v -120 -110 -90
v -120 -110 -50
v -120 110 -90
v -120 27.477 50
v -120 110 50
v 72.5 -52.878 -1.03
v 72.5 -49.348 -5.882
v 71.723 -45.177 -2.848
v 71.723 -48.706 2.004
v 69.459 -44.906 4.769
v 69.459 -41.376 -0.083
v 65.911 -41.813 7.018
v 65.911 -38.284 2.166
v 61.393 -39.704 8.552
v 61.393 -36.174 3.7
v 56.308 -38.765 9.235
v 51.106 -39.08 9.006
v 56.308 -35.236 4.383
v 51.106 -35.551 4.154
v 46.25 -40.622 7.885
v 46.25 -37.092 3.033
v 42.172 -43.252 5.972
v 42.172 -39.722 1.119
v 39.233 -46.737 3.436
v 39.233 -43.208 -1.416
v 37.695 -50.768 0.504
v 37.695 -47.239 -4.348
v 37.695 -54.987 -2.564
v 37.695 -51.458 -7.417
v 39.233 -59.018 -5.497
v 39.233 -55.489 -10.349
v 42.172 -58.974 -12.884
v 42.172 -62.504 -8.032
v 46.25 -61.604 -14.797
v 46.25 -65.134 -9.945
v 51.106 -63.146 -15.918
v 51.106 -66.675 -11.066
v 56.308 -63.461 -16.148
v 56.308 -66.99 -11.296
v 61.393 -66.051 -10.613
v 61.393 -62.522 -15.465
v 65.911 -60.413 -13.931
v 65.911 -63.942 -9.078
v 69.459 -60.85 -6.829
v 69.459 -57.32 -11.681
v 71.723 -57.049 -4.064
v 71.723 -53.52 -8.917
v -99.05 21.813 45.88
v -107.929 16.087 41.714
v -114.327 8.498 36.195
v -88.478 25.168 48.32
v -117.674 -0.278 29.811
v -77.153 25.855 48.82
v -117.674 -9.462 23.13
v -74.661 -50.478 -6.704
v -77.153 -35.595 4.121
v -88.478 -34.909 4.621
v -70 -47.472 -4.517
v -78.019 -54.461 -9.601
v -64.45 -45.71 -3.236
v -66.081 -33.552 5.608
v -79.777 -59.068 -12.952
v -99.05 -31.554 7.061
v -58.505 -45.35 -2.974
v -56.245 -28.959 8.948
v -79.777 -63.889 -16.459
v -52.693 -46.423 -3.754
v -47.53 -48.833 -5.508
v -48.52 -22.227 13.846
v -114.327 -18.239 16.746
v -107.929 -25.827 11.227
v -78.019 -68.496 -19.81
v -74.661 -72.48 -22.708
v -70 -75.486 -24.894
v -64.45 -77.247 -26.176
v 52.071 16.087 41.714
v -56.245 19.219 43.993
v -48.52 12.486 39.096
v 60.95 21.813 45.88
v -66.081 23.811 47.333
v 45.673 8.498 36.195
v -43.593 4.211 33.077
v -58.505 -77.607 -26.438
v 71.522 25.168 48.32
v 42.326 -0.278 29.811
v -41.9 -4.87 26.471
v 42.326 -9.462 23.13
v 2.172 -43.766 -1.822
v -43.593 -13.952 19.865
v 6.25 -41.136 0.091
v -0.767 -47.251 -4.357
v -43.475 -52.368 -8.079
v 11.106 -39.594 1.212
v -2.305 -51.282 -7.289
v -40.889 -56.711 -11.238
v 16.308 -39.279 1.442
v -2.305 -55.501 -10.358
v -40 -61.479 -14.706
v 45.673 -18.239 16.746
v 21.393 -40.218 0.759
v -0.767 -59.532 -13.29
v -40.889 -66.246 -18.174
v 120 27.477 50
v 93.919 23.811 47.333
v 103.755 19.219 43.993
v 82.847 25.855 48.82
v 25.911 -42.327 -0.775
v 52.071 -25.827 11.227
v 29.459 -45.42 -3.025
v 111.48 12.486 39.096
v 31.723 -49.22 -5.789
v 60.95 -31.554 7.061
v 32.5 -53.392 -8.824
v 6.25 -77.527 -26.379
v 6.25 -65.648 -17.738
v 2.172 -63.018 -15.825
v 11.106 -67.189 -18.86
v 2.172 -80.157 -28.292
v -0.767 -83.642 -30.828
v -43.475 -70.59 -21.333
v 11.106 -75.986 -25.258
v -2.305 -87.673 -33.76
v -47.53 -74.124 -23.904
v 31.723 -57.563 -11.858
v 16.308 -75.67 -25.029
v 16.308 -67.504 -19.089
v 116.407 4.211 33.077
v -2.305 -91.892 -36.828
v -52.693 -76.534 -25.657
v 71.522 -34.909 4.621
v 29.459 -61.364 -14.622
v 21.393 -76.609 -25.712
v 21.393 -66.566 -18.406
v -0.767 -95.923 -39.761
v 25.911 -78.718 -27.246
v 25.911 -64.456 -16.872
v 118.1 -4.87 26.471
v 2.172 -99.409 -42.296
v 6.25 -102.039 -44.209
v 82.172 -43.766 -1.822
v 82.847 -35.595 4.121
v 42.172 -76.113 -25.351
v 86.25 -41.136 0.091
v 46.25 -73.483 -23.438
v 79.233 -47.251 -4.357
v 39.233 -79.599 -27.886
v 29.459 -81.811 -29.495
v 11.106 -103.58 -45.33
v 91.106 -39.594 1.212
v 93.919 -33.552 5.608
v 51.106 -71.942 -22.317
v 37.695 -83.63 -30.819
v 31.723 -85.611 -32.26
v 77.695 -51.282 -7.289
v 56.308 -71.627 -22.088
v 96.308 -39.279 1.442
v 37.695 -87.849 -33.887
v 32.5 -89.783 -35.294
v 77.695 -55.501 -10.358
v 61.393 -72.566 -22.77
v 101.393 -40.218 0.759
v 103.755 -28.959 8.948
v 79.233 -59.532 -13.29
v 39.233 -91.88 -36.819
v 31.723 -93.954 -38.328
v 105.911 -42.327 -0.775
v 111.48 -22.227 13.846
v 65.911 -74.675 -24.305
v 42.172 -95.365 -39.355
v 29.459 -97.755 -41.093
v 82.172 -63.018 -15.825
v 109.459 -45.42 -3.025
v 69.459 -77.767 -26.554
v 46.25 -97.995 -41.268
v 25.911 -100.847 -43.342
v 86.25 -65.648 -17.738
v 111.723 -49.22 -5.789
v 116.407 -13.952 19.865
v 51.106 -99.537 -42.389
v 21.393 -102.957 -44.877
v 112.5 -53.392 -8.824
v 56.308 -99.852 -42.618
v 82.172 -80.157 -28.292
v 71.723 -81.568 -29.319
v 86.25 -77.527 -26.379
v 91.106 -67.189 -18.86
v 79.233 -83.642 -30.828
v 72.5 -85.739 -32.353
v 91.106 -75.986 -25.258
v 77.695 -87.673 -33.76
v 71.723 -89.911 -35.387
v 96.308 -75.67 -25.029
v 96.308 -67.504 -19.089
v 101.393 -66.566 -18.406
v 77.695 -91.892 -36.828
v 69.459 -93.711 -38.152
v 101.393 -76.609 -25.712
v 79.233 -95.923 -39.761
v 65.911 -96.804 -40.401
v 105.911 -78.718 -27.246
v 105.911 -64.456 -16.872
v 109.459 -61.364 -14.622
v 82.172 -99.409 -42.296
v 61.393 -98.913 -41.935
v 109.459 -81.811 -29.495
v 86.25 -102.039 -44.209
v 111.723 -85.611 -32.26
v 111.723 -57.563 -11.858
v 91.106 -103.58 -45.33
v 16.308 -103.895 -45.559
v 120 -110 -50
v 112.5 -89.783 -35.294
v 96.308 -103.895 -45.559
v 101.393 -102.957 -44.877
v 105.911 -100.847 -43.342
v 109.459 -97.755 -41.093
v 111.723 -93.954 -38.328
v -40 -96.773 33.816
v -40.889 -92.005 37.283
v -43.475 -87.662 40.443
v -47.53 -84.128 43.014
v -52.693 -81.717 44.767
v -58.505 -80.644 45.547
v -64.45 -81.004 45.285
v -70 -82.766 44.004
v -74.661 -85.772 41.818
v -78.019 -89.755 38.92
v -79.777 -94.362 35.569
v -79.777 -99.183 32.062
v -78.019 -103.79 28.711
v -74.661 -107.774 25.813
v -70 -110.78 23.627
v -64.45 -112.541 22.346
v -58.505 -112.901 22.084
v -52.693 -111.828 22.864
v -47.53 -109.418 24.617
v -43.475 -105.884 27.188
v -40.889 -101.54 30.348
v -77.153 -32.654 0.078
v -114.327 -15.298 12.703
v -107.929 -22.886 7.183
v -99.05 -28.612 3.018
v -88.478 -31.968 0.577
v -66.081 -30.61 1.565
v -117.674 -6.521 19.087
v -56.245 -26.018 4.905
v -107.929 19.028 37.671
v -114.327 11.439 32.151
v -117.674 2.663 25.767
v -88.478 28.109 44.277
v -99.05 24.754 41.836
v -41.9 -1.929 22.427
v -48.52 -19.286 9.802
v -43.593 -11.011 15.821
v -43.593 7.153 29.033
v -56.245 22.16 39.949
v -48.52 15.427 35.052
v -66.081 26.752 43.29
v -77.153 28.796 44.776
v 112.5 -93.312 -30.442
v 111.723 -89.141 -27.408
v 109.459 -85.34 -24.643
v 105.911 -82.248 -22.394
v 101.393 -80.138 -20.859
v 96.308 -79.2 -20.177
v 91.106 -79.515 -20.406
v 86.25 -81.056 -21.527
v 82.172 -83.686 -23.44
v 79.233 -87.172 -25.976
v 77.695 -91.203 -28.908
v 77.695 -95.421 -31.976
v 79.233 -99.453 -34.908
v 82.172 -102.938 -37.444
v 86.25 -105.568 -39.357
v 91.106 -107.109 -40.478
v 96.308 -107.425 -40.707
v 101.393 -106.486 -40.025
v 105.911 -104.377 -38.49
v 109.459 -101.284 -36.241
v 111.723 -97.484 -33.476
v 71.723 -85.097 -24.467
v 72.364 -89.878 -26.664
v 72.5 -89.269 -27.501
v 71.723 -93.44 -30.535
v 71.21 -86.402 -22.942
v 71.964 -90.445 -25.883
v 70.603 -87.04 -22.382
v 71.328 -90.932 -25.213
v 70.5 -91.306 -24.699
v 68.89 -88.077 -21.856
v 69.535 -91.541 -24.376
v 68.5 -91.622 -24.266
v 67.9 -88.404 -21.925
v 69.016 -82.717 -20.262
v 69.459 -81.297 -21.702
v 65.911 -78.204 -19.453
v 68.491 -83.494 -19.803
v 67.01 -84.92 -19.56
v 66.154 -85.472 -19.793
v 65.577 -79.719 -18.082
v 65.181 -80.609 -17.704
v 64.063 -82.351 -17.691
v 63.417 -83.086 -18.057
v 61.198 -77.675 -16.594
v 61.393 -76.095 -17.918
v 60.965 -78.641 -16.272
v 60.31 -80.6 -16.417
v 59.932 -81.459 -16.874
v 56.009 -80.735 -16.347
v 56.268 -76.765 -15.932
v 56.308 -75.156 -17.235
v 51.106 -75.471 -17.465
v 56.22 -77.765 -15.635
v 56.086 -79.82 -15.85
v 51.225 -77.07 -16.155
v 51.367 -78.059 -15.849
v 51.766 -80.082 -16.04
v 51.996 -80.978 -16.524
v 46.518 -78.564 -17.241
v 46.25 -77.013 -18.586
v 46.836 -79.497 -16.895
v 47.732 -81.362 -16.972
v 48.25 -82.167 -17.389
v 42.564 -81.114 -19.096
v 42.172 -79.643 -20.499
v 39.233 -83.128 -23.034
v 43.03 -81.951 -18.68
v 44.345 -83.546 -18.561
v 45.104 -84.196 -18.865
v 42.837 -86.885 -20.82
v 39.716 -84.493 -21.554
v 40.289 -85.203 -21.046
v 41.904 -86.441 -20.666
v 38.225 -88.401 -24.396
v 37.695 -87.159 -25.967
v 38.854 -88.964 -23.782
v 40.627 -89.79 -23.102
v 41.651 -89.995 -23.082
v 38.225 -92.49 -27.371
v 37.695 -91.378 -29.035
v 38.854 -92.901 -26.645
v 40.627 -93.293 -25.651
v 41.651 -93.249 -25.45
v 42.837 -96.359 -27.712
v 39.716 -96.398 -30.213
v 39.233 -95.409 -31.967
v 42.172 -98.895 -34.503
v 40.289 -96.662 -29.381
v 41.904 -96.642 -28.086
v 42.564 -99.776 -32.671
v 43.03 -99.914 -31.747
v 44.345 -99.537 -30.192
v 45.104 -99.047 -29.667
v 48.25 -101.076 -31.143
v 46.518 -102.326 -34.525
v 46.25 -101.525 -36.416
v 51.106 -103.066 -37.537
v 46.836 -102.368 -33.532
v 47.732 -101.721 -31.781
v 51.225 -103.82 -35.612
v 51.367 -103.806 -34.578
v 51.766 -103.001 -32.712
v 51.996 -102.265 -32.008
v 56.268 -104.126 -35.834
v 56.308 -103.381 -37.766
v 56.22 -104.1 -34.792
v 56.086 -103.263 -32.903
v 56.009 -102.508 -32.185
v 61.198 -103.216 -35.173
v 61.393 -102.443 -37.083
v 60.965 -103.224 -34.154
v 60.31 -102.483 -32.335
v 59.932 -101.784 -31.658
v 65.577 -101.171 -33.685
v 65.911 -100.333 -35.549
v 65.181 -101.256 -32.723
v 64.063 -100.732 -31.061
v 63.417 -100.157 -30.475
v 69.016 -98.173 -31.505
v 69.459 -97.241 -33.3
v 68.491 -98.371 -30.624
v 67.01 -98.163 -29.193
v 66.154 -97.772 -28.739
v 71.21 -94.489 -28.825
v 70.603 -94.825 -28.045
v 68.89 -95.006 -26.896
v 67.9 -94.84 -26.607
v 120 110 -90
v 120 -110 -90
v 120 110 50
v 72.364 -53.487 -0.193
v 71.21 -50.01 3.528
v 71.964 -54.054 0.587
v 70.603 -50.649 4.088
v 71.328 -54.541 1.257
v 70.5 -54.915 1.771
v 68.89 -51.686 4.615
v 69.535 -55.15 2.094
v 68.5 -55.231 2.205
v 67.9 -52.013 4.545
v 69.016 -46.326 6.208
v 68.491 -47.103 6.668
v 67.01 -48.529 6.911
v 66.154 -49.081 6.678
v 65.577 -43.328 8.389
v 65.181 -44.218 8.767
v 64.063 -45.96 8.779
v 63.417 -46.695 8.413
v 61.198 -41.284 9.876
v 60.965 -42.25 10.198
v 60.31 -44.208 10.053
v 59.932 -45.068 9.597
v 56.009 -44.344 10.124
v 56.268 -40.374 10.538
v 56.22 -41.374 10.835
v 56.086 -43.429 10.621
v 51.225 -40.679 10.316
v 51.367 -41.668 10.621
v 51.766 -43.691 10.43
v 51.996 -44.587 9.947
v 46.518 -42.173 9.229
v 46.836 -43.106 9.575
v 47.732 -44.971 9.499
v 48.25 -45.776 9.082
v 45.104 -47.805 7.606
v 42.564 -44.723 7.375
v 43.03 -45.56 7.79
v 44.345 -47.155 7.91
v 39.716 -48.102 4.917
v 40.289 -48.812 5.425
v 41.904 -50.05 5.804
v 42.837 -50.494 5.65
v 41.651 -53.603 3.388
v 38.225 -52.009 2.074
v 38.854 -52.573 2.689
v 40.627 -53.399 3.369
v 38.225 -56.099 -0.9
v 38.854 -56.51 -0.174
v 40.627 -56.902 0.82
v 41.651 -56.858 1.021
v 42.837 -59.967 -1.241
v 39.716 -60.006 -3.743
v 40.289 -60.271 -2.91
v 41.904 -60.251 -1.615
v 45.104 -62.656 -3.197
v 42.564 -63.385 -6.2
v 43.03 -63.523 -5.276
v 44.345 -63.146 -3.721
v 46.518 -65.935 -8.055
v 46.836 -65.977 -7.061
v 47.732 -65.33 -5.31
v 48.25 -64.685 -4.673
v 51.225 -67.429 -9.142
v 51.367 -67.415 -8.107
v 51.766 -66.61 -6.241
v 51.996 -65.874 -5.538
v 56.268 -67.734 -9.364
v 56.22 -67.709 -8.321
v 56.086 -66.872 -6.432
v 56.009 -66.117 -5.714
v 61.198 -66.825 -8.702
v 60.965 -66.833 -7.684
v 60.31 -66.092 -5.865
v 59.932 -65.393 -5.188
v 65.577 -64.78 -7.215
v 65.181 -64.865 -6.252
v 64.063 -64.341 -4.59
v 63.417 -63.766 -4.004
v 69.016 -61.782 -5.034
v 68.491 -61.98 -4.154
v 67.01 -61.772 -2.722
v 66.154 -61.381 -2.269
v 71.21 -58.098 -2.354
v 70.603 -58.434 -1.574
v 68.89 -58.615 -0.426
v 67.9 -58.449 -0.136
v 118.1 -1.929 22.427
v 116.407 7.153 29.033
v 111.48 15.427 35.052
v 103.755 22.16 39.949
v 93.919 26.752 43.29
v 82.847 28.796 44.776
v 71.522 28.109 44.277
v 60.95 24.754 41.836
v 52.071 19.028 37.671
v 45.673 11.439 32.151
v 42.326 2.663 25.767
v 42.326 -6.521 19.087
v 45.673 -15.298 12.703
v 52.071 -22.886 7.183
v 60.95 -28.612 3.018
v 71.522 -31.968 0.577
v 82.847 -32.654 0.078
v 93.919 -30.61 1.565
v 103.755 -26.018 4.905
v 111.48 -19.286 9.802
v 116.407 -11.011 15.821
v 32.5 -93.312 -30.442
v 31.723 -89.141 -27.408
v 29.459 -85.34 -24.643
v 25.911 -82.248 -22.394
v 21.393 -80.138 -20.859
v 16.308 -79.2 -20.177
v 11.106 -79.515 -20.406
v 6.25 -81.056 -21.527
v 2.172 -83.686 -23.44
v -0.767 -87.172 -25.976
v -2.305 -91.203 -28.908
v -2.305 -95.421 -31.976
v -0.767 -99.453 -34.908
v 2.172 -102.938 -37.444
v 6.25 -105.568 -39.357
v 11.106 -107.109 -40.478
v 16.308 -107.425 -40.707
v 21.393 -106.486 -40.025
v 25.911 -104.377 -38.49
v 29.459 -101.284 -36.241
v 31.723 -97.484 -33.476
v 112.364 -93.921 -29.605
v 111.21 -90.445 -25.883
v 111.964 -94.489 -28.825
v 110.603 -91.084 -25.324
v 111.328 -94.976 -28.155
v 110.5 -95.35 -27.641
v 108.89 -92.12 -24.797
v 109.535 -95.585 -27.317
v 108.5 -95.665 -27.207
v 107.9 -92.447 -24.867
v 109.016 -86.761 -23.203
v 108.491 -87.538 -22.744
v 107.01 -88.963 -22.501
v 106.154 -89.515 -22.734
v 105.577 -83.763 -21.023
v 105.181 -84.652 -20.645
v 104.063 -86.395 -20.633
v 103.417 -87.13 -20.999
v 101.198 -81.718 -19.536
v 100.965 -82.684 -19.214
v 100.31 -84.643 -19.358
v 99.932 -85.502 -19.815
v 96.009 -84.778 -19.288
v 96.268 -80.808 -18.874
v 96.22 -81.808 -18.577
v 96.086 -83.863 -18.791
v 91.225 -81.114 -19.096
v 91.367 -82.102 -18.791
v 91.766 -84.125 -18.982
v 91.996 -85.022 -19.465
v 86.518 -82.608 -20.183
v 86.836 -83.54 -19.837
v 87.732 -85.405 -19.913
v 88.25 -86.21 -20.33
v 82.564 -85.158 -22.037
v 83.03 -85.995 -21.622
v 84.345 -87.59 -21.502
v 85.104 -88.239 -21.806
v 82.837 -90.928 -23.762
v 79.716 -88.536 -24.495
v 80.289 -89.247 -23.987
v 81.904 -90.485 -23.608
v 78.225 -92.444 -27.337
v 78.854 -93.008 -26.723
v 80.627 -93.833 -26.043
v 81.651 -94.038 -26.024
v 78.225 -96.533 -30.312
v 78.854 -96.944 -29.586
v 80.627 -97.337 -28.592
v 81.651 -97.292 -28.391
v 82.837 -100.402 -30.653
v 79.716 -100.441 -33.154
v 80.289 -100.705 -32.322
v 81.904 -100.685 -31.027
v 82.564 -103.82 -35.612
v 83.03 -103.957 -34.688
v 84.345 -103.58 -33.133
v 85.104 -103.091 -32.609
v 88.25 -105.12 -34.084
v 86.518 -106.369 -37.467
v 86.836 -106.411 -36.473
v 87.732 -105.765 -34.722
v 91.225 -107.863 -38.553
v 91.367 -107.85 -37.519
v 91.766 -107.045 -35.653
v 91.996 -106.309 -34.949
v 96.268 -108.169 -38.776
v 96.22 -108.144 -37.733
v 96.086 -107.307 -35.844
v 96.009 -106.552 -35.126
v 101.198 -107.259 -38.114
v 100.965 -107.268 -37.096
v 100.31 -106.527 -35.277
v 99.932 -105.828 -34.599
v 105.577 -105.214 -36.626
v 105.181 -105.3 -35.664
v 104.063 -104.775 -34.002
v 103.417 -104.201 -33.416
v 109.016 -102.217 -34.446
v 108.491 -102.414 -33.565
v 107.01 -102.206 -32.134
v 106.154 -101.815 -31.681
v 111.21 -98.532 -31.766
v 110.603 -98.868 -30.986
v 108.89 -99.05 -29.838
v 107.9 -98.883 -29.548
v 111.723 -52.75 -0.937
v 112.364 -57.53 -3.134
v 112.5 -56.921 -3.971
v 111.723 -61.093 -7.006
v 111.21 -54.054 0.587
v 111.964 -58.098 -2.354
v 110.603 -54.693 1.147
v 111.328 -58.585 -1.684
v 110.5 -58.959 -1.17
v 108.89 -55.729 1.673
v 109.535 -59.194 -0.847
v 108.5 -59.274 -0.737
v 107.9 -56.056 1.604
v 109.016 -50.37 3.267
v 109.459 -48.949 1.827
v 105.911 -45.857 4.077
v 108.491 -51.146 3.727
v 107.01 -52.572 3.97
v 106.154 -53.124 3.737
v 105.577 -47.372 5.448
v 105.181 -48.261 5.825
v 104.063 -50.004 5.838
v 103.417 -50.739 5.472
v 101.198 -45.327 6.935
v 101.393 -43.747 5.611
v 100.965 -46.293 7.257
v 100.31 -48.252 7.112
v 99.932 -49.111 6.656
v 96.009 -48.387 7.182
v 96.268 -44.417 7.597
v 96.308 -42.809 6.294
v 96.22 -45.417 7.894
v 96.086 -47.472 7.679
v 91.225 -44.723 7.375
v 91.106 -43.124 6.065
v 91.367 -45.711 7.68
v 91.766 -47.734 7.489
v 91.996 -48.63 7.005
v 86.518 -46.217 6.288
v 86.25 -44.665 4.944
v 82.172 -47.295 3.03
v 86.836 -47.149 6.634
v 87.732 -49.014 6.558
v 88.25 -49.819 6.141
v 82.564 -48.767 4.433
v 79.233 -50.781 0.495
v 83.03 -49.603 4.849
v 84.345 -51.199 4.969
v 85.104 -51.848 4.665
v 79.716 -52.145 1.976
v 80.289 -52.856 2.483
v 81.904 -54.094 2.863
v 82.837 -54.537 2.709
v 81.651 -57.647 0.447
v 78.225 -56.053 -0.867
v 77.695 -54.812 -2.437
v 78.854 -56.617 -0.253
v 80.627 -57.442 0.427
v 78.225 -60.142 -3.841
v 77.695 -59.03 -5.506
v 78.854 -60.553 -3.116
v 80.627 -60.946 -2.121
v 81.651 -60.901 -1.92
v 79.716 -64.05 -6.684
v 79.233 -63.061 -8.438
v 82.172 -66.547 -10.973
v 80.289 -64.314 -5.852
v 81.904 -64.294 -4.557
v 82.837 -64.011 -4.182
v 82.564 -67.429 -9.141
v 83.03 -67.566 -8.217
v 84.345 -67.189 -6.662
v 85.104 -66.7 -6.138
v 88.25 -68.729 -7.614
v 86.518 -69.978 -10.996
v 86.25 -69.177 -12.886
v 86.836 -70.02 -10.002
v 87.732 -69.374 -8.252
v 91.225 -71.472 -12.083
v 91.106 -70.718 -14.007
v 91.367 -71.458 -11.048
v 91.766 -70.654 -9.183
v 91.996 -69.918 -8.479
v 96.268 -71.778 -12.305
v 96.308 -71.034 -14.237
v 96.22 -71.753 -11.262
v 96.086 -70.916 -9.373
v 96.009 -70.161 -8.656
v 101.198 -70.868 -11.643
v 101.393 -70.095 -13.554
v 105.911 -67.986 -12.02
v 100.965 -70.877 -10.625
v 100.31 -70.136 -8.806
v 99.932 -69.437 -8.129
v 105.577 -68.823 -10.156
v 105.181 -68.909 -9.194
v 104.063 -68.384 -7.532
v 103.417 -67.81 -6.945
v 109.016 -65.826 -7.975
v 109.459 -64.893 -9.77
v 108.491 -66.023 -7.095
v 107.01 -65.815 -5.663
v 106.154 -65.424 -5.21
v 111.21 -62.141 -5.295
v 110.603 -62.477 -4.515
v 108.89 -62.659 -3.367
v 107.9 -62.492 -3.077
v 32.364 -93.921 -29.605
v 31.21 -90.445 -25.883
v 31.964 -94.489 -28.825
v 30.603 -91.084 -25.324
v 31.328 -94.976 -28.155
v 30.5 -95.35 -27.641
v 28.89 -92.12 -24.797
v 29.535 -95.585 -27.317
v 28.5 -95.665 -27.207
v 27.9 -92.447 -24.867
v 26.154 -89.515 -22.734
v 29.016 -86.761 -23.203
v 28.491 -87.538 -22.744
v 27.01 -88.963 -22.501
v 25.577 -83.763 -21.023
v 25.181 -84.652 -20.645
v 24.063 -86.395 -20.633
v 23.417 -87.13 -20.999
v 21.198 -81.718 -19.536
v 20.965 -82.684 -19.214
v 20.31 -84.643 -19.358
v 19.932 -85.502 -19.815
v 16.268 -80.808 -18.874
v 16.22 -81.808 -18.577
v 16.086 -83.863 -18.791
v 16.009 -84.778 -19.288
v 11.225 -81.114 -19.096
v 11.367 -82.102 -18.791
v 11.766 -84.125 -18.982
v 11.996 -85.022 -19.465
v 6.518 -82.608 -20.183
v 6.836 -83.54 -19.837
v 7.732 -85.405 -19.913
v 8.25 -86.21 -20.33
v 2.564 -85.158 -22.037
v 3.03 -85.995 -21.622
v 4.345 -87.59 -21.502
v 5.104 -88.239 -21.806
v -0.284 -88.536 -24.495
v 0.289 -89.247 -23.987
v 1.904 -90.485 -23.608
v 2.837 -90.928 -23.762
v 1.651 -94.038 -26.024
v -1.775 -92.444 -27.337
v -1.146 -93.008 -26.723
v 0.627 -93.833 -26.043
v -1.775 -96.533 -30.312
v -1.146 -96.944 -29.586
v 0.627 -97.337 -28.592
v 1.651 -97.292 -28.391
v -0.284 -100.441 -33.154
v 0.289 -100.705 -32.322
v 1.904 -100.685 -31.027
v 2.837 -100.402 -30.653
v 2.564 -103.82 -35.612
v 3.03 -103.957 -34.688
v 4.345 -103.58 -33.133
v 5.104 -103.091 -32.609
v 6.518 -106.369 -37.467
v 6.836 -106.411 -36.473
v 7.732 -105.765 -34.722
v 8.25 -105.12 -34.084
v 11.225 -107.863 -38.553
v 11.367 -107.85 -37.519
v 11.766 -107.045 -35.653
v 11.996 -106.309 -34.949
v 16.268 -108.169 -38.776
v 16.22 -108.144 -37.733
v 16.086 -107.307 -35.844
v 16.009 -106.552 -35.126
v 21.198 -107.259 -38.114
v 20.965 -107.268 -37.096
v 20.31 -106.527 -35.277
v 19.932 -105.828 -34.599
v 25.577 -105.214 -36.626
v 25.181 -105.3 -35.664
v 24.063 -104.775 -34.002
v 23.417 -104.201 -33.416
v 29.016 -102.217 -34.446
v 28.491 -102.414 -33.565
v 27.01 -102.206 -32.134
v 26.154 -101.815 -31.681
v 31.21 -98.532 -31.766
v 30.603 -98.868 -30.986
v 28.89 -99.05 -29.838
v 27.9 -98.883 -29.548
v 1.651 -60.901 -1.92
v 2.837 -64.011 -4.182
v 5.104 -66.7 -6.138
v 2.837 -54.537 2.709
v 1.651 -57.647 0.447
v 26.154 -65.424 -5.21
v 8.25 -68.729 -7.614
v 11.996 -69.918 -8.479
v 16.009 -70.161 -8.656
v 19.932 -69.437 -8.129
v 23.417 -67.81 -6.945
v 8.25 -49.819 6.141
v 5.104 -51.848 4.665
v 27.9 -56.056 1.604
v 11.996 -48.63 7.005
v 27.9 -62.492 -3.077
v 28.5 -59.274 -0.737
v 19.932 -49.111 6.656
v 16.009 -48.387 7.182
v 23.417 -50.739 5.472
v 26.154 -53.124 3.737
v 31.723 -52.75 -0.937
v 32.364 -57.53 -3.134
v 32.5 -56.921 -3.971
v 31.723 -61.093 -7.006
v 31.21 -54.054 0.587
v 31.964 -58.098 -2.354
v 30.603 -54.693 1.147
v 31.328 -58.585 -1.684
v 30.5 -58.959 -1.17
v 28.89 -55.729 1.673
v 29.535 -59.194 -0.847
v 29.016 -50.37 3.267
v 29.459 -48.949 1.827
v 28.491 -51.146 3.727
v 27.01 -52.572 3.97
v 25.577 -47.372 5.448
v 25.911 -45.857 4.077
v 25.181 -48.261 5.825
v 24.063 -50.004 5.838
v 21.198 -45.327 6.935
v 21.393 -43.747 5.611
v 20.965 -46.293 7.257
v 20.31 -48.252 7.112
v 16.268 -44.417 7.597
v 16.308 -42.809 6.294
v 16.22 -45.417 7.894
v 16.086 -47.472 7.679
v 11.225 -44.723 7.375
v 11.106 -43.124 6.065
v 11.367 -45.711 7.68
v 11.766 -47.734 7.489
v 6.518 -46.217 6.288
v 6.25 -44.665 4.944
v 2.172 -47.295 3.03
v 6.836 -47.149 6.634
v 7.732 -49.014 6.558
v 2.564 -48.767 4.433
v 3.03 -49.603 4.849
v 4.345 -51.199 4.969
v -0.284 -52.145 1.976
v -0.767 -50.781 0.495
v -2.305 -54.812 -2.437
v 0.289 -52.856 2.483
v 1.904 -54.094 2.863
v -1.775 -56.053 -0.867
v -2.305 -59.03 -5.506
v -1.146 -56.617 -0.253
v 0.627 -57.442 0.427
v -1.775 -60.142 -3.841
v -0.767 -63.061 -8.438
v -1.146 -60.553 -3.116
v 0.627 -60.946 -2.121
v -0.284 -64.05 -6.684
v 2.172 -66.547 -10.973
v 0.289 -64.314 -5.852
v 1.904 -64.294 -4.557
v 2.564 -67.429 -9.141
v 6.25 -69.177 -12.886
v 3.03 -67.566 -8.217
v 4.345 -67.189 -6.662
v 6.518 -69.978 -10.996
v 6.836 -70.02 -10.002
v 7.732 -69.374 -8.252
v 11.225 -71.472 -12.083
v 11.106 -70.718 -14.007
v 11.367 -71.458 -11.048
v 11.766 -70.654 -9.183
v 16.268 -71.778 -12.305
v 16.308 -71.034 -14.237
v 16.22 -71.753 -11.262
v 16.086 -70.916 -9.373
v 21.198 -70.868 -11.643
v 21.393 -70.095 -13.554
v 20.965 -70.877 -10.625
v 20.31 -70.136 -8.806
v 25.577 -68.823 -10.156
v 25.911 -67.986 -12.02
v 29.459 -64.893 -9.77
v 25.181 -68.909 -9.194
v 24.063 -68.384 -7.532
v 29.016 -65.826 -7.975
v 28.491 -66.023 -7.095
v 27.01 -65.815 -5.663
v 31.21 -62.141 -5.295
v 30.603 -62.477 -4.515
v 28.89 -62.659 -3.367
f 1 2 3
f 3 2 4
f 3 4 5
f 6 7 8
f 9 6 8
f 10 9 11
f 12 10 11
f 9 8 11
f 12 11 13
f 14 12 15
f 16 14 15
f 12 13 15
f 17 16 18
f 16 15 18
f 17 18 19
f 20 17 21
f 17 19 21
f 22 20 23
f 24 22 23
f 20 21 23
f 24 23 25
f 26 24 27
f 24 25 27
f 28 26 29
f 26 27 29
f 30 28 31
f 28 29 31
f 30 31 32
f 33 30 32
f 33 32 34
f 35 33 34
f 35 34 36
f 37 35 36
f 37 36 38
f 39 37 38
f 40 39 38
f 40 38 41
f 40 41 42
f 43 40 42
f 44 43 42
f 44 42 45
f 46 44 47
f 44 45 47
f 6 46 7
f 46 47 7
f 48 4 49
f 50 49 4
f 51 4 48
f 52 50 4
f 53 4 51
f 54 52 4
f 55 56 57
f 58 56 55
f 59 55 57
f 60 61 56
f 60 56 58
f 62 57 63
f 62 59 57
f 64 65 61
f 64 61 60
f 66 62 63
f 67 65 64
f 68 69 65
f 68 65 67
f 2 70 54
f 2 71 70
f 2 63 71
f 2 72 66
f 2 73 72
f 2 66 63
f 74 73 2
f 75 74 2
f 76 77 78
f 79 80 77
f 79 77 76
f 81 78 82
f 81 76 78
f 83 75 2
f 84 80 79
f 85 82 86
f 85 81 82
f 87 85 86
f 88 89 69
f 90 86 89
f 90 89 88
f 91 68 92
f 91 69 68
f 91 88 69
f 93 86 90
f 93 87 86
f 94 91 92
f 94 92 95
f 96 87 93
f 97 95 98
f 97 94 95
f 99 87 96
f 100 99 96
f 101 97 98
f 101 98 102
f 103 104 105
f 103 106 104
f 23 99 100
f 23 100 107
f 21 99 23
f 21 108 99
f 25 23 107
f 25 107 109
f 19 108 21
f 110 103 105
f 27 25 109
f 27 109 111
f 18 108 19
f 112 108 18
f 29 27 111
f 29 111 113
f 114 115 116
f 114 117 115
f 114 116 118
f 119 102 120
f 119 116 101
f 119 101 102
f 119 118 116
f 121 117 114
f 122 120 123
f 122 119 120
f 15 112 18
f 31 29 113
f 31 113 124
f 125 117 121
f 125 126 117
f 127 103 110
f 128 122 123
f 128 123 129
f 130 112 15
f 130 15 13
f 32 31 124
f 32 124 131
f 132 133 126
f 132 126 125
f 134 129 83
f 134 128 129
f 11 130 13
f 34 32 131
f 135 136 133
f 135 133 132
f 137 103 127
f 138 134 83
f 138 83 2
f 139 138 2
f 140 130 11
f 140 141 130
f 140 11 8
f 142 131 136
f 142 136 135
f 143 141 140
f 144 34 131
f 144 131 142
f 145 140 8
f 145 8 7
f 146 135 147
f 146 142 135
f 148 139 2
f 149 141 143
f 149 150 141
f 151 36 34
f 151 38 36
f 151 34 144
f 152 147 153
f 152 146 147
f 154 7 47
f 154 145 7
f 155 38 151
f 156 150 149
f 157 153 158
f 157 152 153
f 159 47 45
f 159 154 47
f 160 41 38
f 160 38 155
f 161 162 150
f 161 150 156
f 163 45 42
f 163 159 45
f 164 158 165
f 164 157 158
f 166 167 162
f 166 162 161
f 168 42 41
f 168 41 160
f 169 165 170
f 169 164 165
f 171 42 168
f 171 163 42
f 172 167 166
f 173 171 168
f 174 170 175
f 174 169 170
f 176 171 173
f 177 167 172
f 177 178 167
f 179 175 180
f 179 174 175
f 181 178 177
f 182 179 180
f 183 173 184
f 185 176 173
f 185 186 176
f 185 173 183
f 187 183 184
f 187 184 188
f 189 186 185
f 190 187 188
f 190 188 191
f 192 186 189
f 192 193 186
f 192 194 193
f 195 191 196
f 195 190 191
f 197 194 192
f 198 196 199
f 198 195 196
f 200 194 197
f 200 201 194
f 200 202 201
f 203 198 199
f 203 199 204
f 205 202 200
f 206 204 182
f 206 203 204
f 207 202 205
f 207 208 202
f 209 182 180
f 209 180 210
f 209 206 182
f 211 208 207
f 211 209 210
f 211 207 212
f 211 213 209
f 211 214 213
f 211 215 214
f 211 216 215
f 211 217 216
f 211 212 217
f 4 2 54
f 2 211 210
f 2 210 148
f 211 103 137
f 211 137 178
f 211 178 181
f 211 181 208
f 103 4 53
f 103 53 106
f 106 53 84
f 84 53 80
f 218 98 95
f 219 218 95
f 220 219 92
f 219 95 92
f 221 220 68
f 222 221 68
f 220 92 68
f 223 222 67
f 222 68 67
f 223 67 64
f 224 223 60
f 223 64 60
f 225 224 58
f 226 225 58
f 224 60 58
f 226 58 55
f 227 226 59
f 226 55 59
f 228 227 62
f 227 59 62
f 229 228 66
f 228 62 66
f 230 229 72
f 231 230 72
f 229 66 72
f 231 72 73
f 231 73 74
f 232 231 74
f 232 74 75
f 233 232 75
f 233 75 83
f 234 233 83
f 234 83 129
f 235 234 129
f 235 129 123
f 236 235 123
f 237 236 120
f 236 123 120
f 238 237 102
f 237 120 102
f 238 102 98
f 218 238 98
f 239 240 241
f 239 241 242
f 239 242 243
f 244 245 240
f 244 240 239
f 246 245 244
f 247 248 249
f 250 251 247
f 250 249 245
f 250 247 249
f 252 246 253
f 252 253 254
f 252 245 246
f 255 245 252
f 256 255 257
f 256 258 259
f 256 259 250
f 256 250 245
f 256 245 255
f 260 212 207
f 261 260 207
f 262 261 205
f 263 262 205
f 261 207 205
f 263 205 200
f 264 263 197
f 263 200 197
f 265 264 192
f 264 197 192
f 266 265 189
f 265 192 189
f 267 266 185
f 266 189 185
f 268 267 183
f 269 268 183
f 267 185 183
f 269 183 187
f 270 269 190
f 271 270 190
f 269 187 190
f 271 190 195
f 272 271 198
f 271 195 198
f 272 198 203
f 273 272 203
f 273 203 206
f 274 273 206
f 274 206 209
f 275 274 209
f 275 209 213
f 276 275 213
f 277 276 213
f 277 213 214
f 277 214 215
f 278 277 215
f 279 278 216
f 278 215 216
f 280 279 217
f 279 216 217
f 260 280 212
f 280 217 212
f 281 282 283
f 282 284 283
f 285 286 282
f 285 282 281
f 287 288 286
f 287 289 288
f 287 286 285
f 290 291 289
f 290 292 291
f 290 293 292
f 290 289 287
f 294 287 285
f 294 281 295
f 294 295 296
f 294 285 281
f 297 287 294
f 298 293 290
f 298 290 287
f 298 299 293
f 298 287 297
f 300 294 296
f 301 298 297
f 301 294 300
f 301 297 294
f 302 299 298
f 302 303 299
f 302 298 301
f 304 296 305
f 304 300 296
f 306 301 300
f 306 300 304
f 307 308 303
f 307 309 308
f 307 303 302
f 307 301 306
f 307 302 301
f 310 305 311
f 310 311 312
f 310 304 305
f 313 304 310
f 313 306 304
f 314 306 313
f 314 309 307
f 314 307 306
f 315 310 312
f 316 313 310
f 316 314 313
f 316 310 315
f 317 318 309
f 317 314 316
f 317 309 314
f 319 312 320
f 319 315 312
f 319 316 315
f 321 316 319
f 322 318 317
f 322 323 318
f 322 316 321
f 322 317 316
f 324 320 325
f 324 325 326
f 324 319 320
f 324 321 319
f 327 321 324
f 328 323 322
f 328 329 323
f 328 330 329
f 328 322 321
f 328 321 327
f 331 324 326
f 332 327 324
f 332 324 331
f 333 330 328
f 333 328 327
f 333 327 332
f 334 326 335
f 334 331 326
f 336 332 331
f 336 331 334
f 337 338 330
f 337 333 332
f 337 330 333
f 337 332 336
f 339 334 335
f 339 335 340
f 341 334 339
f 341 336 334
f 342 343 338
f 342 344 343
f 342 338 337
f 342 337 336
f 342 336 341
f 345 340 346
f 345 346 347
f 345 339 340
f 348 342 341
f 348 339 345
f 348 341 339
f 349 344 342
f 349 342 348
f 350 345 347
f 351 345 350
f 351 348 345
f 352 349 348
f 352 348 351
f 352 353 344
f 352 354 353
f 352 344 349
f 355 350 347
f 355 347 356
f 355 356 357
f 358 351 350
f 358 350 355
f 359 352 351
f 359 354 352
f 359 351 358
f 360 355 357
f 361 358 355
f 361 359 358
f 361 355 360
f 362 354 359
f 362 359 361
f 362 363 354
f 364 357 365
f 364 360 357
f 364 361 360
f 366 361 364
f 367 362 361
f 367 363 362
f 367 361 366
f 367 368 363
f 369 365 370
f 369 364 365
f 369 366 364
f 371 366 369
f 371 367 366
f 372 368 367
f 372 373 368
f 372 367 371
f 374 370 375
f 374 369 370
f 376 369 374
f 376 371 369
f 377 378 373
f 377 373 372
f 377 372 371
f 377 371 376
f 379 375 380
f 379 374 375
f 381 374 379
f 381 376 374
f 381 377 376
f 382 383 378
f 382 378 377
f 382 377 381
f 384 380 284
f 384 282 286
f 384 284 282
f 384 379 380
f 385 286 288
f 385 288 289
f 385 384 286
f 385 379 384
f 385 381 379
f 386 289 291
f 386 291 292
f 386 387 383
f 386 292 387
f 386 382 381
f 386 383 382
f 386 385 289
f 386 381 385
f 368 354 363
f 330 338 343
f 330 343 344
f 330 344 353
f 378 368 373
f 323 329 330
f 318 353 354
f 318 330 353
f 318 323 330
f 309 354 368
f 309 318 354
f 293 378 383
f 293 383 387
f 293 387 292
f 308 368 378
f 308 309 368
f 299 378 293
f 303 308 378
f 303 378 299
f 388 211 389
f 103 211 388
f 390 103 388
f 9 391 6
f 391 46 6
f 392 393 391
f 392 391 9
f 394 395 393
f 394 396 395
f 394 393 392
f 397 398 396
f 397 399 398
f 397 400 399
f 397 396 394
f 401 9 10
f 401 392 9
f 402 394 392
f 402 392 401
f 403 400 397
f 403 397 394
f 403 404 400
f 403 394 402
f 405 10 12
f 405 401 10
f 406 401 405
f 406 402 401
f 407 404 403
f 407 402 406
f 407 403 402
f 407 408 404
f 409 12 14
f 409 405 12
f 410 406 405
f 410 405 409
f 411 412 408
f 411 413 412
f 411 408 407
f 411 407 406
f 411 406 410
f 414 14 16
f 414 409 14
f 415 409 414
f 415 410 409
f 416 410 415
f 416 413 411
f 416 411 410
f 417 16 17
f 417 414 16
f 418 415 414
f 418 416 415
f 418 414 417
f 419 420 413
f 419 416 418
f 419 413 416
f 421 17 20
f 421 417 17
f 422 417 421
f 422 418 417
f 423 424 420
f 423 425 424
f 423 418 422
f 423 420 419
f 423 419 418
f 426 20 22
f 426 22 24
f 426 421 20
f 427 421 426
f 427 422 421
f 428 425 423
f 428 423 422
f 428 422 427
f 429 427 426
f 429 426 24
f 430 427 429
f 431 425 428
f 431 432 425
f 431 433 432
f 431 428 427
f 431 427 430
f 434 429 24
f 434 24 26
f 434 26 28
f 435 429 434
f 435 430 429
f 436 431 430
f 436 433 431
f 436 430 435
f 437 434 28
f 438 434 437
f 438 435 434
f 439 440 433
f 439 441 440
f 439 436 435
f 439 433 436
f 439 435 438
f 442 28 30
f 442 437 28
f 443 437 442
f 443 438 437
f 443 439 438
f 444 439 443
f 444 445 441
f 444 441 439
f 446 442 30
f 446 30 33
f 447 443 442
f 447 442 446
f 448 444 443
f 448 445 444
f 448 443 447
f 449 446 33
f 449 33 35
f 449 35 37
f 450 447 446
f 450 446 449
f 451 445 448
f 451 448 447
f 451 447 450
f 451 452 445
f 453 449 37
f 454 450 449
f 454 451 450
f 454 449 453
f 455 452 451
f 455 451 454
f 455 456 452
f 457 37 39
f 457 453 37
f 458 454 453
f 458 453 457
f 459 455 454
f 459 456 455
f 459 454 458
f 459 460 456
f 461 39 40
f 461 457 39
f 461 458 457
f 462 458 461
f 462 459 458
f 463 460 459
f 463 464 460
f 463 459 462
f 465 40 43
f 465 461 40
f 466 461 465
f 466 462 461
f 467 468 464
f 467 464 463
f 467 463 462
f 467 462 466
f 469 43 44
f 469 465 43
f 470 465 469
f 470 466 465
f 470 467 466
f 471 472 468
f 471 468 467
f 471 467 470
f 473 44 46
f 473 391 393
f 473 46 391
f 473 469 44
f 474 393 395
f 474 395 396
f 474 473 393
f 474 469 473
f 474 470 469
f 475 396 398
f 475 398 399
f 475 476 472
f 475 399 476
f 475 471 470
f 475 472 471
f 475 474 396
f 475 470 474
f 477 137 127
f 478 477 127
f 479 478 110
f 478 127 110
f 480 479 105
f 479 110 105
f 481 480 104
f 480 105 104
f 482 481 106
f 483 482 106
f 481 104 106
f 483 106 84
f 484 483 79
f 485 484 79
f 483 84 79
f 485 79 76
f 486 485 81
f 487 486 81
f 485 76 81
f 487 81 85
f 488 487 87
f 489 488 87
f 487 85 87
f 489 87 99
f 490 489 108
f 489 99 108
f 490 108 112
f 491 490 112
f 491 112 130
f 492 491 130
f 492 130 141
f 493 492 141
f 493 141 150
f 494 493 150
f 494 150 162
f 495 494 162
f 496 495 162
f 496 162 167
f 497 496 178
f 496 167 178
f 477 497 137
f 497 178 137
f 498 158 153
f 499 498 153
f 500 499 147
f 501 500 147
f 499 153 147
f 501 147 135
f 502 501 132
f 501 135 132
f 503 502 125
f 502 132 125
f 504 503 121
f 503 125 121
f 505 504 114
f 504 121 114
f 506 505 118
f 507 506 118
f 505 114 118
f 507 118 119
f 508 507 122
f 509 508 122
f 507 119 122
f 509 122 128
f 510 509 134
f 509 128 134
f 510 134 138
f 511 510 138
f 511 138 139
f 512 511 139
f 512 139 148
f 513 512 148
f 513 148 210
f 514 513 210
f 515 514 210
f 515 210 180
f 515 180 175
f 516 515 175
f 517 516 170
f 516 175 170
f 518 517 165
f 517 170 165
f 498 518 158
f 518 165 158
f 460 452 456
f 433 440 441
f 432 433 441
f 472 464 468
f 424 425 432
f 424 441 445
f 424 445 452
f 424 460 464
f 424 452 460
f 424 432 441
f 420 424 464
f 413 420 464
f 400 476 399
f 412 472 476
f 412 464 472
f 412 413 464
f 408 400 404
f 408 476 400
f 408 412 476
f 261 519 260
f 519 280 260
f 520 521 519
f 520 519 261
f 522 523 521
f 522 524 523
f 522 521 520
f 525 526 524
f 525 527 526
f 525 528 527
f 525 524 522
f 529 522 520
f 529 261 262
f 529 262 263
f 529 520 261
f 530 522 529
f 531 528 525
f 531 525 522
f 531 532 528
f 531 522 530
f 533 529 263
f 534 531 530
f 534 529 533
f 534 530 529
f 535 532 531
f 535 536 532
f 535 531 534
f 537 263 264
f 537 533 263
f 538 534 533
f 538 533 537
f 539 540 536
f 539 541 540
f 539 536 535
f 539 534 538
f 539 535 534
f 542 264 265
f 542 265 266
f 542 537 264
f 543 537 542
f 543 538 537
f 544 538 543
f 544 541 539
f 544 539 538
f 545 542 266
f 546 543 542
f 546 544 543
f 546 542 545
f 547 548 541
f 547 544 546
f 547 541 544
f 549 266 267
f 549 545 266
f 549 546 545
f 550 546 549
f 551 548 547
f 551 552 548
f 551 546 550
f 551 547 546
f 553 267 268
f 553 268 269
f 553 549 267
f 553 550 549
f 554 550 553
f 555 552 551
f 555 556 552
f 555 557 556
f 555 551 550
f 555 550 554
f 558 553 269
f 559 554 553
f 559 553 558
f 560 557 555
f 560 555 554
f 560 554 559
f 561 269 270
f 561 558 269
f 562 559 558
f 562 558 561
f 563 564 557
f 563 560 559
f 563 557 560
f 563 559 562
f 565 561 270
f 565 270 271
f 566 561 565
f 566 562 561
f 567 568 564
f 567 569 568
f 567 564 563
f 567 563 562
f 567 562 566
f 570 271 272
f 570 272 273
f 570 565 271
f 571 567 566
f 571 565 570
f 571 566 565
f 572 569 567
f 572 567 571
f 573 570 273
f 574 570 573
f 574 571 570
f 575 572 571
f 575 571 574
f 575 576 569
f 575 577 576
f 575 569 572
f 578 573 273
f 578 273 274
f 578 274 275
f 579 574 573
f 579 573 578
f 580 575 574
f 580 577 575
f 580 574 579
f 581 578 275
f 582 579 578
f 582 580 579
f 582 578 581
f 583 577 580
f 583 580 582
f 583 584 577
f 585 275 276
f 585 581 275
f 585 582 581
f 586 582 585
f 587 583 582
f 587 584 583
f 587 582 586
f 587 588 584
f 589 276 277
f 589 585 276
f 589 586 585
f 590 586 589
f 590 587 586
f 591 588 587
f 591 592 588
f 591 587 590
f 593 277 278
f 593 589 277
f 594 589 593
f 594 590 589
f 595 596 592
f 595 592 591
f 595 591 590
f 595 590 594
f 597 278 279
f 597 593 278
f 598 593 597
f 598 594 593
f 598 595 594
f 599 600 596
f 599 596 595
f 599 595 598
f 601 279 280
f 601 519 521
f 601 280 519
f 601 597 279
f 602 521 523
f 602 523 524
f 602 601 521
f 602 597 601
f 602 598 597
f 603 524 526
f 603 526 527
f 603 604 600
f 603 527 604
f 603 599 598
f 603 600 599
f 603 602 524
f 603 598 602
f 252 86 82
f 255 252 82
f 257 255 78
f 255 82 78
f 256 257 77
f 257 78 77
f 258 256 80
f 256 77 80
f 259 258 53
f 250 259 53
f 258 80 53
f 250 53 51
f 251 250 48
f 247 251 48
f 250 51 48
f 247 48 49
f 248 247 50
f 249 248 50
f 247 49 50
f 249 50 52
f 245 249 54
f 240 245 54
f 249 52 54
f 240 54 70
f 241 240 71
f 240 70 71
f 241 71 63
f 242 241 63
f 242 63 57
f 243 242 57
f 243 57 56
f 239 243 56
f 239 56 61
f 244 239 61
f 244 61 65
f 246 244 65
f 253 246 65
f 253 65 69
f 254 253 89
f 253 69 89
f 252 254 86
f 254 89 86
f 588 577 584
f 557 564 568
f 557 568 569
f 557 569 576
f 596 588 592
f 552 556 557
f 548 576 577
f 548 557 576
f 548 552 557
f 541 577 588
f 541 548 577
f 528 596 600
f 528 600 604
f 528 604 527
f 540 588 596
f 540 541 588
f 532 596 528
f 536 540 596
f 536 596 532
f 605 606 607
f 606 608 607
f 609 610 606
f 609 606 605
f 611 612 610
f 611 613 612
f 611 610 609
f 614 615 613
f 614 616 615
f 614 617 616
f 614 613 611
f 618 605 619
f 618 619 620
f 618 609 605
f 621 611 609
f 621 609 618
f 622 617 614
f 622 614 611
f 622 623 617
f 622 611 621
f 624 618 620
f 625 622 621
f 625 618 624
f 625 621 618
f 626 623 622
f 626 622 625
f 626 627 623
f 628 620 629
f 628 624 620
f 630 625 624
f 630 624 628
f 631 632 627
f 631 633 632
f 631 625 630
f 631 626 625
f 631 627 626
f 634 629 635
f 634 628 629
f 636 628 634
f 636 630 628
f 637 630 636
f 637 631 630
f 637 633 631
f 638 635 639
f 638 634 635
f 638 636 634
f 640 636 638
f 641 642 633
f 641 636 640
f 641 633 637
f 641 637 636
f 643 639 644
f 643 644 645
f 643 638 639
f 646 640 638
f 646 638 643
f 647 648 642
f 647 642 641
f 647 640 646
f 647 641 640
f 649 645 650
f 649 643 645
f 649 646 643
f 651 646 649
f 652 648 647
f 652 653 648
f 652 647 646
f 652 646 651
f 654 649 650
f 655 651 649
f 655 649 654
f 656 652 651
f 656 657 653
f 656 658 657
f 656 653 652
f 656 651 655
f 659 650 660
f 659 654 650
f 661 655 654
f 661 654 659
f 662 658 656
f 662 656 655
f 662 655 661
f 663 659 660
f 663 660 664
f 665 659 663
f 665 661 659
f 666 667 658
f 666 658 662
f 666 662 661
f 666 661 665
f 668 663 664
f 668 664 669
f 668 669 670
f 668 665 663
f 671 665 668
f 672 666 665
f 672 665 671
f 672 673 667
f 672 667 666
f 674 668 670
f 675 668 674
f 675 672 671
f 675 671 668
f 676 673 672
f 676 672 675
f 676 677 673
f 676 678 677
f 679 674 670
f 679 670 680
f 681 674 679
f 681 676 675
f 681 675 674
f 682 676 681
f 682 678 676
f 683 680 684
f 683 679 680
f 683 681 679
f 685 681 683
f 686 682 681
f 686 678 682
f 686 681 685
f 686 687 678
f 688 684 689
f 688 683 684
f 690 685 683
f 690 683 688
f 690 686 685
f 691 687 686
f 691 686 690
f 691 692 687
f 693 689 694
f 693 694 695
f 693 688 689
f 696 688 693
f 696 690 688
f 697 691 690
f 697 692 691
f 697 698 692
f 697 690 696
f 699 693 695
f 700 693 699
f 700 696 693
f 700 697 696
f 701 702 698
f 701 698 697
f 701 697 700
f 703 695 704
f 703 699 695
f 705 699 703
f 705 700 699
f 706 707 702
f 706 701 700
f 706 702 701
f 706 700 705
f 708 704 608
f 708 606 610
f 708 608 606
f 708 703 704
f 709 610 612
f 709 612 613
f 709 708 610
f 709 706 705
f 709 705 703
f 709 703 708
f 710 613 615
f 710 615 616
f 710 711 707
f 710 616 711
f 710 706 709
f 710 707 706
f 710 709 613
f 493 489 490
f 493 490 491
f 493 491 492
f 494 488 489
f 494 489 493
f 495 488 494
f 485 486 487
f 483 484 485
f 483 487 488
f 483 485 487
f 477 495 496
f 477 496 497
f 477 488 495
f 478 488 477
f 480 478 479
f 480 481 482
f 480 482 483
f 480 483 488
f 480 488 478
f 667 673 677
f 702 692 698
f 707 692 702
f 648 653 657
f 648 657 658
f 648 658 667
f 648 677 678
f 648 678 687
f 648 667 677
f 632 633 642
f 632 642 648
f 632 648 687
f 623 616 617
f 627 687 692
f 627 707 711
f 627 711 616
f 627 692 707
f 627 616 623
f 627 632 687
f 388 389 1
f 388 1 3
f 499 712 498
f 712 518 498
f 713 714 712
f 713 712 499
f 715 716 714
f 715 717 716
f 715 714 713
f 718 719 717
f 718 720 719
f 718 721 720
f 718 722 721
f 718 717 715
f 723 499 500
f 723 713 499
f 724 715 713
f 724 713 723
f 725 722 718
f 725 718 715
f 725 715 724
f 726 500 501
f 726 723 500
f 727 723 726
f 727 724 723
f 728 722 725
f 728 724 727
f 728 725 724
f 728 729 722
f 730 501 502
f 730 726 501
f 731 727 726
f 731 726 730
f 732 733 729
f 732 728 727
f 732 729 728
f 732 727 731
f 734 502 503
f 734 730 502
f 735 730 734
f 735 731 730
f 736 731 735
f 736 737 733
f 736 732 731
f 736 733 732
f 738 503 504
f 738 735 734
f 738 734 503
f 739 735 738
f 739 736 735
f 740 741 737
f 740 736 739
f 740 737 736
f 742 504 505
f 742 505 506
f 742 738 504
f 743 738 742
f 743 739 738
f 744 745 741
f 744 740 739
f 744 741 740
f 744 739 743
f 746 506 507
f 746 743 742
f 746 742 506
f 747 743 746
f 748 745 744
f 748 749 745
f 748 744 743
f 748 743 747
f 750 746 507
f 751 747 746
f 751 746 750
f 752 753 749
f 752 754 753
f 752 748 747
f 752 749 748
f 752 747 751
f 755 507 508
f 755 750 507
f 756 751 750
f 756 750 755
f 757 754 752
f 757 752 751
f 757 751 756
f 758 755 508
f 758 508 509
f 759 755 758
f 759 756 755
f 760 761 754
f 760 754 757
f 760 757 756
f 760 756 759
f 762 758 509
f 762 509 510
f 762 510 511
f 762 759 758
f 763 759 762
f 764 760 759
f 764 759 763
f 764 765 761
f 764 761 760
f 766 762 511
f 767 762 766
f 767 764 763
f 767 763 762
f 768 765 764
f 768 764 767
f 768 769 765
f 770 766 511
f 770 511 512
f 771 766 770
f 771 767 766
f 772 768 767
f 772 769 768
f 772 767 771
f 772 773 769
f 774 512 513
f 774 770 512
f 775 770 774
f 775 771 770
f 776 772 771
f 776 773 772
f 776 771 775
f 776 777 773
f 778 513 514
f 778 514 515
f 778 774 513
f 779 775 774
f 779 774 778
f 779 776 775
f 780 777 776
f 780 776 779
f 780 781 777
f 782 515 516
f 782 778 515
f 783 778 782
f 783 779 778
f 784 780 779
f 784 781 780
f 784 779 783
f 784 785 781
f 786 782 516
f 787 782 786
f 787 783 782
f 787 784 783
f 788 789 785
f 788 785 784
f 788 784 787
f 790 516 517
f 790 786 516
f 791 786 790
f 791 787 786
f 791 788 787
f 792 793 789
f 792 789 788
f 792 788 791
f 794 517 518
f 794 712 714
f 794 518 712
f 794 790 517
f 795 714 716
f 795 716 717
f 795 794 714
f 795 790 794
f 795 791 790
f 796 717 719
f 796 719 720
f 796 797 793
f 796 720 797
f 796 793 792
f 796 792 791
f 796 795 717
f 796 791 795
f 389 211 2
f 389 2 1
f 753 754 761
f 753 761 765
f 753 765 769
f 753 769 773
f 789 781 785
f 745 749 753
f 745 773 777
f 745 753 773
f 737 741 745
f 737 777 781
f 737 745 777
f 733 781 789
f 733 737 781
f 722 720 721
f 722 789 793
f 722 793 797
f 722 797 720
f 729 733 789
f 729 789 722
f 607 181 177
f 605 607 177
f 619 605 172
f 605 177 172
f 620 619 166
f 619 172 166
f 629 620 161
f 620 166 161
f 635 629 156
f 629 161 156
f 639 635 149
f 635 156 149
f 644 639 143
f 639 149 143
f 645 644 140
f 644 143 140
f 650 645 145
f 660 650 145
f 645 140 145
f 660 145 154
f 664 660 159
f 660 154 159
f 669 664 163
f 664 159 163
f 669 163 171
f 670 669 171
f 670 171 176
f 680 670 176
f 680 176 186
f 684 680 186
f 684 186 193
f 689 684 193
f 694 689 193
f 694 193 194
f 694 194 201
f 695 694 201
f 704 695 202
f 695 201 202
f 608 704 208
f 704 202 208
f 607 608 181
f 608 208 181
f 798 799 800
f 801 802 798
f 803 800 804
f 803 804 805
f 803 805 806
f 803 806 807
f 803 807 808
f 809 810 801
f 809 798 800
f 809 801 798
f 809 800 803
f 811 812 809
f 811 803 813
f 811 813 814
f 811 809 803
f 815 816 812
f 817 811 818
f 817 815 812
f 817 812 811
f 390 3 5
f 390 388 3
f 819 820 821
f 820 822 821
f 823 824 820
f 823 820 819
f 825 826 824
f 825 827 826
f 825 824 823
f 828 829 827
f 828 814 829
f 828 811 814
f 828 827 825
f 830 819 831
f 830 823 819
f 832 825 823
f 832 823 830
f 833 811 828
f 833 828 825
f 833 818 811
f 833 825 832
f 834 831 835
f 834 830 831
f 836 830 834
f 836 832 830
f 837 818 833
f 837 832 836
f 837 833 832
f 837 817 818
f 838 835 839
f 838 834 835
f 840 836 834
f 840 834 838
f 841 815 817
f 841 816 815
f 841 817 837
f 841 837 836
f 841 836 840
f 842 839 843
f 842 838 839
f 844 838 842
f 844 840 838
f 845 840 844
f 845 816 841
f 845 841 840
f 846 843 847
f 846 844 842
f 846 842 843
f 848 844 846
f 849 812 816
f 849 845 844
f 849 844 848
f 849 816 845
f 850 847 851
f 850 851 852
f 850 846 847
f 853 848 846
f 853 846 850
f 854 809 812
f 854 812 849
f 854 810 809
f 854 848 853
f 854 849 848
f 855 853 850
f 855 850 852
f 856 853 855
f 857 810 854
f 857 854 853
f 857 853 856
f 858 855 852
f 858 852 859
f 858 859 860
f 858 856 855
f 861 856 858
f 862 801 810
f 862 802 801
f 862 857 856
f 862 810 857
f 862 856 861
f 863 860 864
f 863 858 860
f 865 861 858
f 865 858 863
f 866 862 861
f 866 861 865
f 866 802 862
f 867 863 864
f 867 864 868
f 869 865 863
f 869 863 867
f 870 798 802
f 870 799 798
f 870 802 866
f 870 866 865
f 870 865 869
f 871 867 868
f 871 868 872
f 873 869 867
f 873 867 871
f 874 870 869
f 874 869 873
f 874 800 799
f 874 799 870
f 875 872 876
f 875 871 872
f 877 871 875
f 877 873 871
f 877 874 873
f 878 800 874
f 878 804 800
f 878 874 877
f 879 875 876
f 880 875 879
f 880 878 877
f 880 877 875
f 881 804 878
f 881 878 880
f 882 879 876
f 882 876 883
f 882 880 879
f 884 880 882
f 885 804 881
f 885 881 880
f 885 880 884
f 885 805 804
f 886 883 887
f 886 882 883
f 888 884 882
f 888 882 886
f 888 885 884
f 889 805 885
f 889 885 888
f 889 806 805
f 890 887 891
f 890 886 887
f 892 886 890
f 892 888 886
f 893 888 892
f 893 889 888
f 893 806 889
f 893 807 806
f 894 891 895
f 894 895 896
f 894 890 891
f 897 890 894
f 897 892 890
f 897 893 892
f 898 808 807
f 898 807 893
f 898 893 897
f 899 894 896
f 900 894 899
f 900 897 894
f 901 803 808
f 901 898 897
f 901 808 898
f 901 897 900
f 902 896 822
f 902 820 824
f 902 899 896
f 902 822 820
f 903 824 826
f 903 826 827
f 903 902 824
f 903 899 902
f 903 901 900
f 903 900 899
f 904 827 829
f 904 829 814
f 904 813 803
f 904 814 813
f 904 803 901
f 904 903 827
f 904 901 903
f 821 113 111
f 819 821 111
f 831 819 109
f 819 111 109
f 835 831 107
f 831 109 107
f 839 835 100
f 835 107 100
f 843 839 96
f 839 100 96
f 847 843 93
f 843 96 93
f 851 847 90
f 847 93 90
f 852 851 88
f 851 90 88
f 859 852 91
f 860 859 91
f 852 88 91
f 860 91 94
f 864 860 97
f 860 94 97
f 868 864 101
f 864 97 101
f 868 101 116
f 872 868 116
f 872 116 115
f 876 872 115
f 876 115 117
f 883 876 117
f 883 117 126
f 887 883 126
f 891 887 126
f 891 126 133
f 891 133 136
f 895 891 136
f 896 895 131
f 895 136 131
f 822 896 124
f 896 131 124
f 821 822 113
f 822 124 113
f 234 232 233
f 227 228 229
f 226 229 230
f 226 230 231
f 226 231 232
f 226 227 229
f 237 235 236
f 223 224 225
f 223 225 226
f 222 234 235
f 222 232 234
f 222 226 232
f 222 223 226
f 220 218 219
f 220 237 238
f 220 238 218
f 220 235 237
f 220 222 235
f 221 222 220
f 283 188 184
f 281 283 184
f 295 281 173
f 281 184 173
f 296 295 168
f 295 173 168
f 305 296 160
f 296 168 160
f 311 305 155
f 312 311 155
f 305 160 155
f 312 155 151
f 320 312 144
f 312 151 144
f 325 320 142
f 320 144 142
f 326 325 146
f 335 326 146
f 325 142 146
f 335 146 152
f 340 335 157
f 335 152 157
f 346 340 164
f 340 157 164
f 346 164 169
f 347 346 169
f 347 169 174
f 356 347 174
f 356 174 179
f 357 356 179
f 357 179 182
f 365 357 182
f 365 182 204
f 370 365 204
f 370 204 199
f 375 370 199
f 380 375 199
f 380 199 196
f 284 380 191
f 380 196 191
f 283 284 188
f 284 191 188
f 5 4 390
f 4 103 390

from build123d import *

# Parameters (mm, degrees)
F0_W     = 82.5227291513
F0_H     = 100
F1_DEPTH = 120
F2_R     = 38.1
F3_DEPTH = 5
F4_DEPTH = 5
F2_R_2   = 17.5
F5_DEPTH = 10
F6_DEPTH = 10
F2_R_3   = 20
F7_DEPTH = 60
F8_R     = 4
F9_R     = 4


# Not quite as in the source:
# - the program builds the solid bodies; features that only make, move or delete a surface that nothing else refers to are left out


with BuildPart() as f1:
    # F0 (on Right) → F1 (new body, symmetric)
    with BuildSketch(Plane.YZ):
        Polygon((27.4772708487, -50), (27.4772708487, 50), (-110, -50), align=None)
        with Locations((68.7386354243, 0)):
            Rectangle(F0_W, F0_H)
        Polygon((27.4772708487, -50), (-110, -50), (-110, -90), (110, -90), (110, -50), align=None)
    extrude(amount=F1_DEPTH, both=True)

    # F2 (on face) → F3 (cut)
    with BuildSketch(Plane(origin=(0, -14.2772887805, 19.6280269666), x_dir=(1, 0, 0), z_dir=(0, -0.5882352941, 0.8086898285))):
        with Locations((-80, 11.6323541567)):
            Circle(F2_R)
    extrude(amount=-F3_DEPTH, mode=Mode.SUBTRACT)

    # F2 (on face) → F4 (cut)
    with BuildSketch(Plane(origin=(0, -14.2772887805, 19.6280269666), x_dir=(1, 0, 0), z_dir=(0, -0.5882352941, 0.8086898285))):
        with Locations((80, 11.6323541567)):
            Circle(F2_R)
    extrude(amount=-F4_DEPTH, mode=Mode.SUBTRACT)

    # F2 (on face) → F5 (join)
    with BuildSketch(Plane(origin=(0, -14.2772887805, 19.6280269666), x_dir=(1, 0, 0), z_dir=(0, -0.5882352941, 0.8086898285))):
        with Locations((15, -48.3676458433)):
            Circle(F2_R_2)
    extrude(amount=F5_DEPTH)

    # F2 (on face) → F6 (join)
    with BuildSketch(Plane(origin=(0, -14.2772887805, 19.6280269666), x_dir=(1, 0, 0), z_dir=(0, -0.5882352941, 0.8086898285))):
        with Locations((15, -93.3676458433)):
            Circle(F2_R_2)
        with Locations((55, -43.3676458433)):
            Circle(F2_R_2)
        with Locations((55, -88.3676458433)):
            Circle(F2_R_2)
        with Locations((95, -48.3676458433)):
            Circle(F2_R_2)
        with Locations((95, -93.3676458433)):
            Circle(F2_R_2)
    extrude(amount=F6_DEPTH)

    # F2 (on face) → F7 (join)
    with BuildSketch(Plane(origin=(0, -14.2772887805, 19.6280269666), x_dir=(1, 0, 0), z_dir=(0, -0.5882352941, 0.8086898285))):
        with Locations((-60, -58.3676458433)):
            Circle(F2_R_3)
    extrude(amount=F7_DEPTH)

    # F8
    f8_edges = [f1.edges().sort_by_distance(p)[0] for p in [
        (-2.5, -59.274065, -0.736631),
    ]]
    fillet(f8_edges, radius=F8_R)

    # F9
    f9_edges = [f1.edges().sort_by_distance(p)[0] for p in [
        (37.5, -55.230616, 2.204545),
        (77.5, -59.274065, -0.736631),
        (77.5, -95.665107, -27.207219),
        (37.5, -91.621658, -24.266043),
        (-2.5, -95.665107, -27.207219),
    ]]
    fillet(f9_edges, radius=F9_R)


solid = f1.part
